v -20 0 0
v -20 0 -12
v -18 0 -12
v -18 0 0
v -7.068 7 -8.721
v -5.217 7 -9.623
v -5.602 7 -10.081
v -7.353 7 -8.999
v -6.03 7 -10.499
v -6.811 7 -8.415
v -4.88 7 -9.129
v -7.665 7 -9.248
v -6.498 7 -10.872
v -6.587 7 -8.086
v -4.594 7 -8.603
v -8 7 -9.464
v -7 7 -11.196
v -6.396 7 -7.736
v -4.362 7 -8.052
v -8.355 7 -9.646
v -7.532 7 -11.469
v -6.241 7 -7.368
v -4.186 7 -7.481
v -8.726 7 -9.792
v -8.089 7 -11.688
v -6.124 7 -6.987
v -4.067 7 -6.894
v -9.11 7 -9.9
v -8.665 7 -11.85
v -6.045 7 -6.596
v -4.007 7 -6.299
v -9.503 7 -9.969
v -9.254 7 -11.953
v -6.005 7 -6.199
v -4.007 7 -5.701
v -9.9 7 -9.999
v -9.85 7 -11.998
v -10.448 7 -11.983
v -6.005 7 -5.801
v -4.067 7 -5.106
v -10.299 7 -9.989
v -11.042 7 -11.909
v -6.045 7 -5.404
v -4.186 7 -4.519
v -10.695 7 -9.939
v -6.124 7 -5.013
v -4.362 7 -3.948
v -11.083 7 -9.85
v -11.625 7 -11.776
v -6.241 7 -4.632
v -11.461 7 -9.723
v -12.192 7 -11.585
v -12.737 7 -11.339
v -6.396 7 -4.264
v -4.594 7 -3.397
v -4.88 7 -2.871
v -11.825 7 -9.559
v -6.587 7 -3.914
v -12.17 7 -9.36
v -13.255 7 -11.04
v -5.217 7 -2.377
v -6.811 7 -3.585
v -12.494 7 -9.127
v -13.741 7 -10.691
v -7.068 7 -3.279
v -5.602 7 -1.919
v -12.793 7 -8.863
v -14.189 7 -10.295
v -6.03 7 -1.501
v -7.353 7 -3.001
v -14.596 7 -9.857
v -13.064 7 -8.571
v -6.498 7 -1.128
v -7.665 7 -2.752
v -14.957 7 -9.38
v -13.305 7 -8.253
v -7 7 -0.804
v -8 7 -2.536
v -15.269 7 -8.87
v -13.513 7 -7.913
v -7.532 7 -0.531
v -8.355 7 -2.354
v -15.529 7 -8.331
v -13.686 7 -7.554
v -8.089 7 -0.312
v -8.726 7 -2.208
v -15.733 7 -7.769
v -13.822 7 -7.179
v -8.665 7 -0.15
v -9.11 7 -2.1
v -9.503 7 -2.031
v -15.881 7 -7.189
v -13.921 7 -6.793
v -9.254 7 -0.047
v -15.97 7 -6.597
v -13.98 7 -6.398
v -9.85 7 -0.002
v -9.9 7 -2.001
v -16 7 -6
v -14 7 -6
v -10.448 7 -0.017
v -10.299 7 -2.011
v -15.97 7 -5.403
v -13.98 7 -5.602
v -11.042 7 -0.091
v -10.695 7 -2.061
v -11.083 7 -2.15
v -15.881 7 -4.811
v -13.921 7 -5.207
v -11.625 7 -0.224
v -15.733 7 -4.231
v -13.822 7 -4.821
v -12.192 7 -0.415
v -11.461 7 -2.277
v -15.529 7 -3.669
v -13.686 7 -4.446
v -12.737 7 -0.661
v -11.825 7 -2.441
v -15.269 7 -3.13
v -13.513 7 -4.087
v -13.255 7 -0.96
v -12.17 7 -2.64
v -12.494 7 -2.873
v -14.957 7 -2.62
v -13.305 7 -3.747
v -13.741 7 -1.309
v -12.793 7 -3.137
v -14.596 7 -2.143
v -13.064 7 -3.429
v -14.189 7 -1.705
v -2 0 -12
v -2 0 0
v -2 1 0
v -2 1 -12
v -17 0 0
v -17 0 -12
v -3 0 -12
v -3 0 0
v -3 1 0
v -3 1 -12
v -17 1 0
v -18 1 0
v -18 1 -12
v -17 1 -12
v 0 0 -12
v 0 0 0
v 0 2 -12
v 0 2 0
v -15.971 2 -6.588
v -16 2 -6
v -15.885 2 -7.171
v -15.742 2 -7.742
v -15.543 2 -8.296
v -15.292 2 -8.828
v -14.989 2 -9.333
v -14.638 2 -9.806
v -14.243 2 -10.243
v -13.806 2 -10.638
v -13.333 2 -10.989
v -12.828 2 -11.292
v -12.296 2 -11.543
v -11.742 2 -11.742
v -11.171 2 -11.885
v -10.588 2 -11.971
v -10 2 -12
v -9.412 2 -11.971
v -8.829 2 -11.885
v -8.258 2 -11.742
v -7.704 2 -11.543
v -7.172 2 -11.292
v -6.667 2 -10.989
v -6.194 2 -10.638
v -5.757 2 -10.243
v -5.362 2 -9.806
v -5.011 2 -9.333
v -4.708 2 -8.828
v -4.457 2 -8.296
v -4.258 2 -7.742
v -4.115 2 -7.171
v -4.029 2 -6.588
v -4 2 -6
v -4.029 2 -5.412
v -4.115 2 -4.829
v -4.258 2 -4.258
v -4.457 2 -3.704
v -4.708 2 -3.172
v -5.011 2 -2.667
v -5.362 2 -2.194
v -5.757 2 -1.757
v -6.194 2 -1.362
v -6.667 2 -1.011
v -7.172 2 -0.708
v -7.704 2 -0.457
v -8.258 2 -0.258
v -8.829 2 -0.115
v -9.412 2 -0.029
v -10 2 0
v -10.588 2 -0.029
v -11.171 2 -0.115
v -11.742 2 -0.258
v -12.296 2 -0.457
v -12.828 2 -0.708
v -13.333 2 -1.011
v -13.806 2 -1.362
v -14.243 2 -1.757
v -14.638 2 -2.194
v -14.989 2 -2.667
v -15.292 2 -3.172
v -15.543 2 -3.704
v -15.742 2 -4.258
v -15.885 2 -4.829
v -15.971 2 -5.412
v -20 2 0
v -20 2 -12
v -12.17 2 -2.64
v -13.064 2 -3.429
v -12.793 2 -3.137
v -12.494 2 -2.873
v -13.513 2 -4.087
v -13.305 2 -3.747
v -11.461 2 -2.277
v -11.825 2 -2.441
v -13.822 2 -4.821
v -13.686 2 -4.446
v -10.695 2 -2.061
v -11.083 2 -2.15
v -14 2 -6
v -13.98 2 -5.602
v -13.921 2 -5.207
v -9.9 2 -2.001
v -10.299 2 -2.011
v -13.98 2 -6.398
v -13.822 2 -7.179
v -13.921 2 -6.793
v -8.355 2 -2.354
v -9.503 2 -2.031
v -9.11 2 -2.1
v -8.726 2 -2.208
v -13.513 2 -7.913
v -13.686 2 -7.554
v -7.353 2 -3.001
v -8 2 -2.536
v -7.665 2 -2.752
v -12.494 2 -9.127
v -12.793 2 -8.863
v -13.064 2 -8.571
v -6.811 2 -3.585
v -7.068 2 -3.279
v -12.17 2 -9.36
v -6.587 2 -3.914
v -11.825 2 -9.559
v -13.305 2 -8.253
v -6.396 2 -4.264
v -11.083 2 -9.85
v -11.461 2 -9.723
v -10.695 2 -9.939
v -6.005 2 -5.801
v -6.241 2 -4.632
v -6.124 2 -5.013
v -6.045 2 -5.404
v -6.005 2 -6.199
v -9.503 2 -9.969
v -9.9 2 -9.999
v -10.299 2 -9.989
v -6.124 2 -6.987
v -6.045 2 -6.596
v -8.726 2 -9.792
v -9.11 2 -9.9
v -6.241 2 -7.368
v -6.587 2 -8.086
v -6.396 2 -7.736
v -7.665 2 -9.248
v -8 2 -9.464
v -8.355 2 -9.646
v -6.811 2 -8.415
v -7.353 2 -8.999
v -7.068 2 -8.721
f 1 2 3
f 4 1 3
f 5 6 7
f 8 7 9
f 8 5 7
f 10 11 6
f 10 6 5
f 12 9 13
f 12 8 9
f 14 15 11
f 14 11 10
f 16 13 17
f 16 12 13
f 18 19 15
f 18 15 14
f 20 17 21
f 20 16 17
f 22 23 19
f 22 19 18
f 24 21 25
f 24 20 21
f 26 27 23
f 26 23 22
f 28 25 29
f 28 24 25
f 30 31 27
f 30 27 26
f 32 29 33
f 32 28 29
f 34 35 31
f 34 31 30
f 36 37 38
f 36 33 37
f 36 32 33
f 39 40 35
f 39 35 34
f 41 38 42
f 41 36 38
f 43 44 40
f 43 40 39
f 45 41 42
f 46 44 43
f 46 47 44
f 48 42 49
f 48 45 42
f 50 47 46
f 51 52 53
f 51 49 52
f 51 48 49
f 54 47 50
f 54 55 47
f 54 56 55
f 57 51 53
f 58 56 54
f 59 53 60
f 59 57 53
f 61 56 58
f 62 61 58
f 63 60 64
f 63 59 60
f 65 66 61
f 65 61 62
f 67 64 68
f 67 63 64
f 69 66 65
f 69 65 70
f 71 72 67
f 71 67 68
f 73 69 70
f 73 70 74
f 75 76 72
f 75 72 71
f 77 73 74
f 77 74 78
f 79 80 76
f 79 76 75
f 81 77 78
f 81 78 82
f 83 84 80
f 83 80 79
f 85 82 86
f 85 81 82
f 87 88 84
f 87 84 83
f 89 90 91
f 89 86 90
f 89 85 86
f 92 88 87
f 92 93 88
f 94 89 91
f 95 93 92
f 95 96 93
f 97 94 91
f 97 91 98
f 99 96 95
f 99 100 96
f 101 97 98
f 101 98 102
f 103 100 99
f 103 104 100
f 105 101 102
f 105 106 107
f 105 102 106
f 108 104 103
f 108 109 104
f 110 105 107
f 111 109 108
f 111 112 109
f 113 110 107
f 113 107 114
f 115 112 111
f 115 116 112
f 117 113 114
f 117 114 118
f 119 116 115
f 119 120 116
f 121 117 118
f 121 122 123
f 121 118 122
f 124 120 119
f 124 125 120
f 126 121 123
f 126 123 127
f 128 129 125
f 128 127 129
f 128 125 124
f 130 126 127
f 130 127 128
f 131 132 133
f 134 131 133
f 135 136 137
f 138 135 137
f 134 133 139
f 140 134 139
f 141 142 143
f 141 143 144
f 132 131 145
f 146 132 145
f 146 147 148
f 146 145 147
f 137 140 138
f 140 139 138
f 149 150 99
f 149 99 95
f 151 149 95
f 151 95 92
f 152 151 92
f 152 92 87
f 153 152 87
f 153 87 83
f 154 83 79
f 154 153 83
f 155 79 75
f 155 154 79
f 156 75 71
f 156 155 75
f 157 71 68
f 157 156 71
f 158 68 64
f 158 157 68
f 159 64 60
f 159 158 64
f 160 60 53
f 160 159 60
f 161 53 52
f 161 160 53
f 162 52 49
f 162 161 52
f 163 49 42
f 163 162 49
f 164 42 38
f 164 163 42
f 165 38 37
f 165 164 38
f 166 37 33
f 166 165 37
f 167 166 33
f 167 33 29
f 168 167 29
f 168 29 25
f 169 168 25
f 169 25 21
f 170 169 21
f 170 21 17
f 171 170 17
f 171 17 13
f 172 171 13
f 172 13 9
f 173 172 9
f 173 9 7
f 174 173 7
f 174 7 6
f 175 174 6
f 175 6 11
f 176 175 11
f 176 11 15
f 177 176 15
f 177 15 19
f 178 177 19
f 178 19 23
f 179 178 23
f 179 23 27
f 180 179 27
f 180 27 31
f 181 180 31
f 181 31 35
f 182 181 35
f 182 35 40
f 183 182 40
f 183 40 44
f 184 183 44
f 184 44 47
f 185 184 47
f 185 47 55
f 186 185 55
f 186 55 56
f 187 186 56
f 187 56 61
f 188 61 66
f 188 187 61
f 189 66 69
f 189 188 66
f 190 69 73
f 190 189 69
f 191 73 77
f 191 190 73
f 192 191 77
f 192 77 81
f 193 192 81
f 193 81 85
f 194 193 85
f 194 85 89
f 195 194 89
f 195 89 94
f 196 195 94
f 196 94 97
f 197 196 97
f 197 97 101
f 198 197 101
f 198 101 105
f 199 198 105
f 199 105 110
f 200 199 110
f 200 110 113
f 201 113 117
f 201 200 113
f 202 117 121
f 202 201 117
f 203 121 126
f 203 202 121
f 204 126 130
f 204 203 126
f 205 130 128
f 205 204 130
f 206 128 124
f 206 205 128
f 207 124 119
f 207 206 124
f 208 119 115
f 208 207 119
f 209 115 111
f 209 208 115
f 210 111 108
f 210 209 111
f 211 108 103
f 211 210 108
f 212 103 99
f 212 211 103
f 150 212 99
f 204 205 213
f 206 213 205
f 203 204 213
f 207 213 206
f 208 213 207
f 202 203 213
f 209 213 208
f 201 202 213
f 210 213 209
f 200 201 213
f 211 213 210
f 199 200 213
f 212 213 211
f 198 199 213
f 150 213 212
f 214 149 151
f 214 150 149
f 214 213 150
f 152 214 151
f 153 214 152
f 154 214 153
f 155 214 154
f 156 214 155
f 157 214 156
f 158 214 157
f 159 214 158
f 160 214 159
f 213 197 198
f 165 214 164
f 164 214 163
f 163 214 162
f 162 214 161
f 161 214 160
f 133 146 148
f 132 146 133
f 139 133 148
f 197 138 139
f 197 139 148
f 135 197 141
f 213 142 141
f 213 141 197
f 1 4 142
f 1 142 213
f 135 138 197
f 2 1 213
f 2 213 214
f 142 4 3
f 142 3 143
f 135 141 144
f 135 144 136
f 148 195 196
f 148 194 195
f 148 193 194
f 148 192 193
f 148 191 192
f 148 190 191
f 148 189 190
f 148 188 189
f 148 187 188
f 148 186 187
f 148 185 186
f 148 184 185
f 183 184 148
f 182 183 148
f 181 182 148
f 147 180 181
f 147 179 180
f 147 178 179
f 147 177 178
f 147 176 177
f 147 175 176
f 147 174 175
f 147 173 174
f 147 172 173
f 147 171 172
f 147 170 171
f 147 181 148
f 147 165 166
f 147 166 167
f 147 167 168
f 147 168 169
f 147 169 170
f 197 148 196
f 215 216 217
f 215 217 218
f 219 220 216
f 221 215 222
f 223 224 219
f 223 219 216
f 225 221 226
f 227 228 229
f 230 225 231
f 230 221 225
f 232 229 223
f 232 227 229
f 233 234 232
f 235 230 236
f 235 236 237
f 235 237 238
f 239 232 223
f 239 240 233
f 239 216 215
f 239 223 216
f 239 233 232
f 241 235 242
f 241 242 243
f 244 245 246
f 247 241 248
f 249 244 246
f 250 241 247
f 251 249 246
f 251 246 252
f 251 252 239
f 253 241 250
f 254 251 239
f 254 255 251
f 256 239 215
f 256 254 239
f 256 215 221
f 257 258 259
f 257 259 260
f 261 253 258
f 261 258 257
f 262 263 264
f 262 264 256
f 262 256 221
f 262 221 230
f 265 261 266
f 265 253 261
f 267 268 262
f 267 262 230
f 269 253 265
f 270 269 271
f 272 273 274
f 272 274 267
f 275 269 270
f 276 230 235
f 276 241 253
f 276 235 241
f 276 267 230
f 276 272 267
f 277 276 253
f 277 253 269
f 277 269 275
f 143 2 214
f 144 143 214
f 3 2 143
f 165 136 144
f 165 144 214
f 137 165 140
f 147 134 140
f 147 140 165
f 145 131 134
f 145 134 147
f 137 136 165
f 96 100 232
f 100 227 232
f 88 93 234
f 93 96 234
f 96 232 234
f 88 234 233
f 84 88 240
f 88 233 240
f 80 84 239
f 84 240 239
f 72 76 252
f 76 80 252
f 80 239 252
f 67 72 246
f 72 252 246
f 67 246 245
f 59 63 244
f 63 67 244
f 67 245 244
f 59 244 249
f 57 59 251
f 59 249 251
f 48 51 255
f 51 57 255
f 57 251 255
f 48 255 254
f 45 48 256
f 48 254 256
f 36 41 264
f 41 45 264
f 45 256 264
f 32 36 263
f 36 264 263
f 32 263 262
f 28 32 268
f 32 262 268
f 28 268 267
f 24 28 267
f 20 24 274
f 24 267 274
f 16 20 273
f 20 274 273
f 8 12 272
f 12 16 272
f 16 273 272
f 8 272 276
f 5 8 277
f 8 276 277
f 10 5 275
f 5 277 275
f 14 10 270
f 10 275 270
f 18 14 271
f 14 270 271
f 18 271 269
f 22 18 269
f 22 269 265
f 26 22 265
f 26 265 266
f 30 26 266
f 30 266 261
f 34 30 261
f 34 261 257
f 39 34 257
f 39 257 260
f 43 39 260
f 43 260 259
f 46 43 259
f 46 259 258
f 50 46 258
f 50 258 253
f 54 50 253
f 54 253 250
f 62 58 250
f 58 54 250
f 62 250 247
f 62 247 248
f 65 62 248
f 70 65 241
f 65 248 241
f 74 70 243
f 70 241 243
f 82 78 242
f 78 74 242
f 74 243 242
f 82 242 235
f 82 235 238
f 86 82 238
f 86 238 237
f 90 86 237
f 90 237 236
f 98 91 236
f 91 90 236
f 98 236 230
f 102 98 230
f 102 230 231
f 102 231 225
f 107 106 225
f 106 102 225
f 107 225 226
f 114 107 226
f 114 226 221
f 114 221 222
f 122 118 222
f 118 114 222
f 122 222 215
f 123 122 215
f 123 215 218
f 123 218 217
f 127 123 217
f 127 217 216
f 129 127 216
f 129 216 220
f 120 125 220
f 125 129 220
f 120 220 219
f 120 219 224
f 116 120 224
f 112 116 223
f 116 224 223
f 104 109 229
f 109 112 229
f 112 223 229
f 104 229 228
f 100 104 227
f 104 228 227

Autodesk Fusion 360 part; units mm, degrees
sketch "Sketch1" plane through (0, 0, 0) normal (0, 1, 0) x (1, 0, 0)
  line L0 (0, 0) -> (-20, 0)
  line L1 (-20, 0) -> (-20, 12)
  line L2 (-20, 12) -> (0, 12)
  line L3 (0, 12) -> (0, 0)
  dimension "d1" = 20
  dimension "d2" = 12
extrude "Extrude1" add sketch "Sketch1" along normal blind 2
sketch "Sketch2" plane through (0, 2, 0) normal (0, 1, 0) x (-1, 0, 0)
  line L0 (0, -12) -> (20, -12)
  line L1 (20, -12) -> (20, 0)
  line L2 (20, 0) -> (0, 0)
  line L3 (0, 0) -> (0, -12)
  circle A0 centre (10, -6) radius 5
  circle A1 centre (10, -6) radius 6
extrude "Extrude2" add sketch "Sketch2" along normal blind 5 contours A1
sketch "Sketch3" plane through (0, 0, 0) normal (0, 0, 1) x (1, 0, 0)
  line L0 (-20, 0) -> (0, 0)
  line L1 (0, 0) -> (0, 2)
  line L2 (0, 2) -> (-10, 2)
  line L3 (-10, 2) -> (-20, 2)
  line L4 (-20, 2) -> (-20, 0)
  line L5 (-17, 0) -> (-18, 0)
  line L6 (-18, 0) -> (-18, 1)
  line L7 (-18, 1) -> (-17, 1)
  line L8 (-17, 1) -> (-17, 0)
  line L9 (-2, 1) -> (-3, 1)
  line L10 (-3, 1) -> (-3, 0)
  line L11 (-3, 0) -> (-2, 0)
  line L12 (-2, 0) -> (-2, 1)
extrude "Extrude3" cut sketch "Sketch3" against normal blind 13 contours L0 L5 L6 L7 L8 | L0 L9 L10 L11 L12
sketch "Sketch4" plane through (0, 0, 0) normal (0, 0, 1) x (1, 0, 0)
  line L0 (-17, 1) -> (-17, 0)
  line L1 (-17, 0) -> (-3, 0)
  line L2 (-3, 0) -> (-3, 1)
  line L3 (-3, 1) -> (-2, 1)
  line L4 (-2, 1) -> (-2, 0)
  line L5 (-2, 0) -> (0, 0)
  line L6 (0, 0) -> (0, 2)
  line L7 (0, 2) -> (-10, 2)
  line L8 (-10, 2) -> (-20, 2)
  line L9 (-20, 2) -> (-20, 0)
  line L10 (-20, 0) -> (-18, 0)
  line L11 (-18, 0) -> (-18, 1)
  line L12 (-18, 1) -> (-17, 1)
sketch "Sketch5" plane through (0, 2, 0) normal (0, 1, 0) x (-1, 0, 0)
  circle A0 centre (10, -6) radius 5
  circle A1 centre (10, -6) radius 5
  circle A2 centre (10, -6) radius 4
extrude "Extrude4" add sketch "Sketch5" along normal blind 5
